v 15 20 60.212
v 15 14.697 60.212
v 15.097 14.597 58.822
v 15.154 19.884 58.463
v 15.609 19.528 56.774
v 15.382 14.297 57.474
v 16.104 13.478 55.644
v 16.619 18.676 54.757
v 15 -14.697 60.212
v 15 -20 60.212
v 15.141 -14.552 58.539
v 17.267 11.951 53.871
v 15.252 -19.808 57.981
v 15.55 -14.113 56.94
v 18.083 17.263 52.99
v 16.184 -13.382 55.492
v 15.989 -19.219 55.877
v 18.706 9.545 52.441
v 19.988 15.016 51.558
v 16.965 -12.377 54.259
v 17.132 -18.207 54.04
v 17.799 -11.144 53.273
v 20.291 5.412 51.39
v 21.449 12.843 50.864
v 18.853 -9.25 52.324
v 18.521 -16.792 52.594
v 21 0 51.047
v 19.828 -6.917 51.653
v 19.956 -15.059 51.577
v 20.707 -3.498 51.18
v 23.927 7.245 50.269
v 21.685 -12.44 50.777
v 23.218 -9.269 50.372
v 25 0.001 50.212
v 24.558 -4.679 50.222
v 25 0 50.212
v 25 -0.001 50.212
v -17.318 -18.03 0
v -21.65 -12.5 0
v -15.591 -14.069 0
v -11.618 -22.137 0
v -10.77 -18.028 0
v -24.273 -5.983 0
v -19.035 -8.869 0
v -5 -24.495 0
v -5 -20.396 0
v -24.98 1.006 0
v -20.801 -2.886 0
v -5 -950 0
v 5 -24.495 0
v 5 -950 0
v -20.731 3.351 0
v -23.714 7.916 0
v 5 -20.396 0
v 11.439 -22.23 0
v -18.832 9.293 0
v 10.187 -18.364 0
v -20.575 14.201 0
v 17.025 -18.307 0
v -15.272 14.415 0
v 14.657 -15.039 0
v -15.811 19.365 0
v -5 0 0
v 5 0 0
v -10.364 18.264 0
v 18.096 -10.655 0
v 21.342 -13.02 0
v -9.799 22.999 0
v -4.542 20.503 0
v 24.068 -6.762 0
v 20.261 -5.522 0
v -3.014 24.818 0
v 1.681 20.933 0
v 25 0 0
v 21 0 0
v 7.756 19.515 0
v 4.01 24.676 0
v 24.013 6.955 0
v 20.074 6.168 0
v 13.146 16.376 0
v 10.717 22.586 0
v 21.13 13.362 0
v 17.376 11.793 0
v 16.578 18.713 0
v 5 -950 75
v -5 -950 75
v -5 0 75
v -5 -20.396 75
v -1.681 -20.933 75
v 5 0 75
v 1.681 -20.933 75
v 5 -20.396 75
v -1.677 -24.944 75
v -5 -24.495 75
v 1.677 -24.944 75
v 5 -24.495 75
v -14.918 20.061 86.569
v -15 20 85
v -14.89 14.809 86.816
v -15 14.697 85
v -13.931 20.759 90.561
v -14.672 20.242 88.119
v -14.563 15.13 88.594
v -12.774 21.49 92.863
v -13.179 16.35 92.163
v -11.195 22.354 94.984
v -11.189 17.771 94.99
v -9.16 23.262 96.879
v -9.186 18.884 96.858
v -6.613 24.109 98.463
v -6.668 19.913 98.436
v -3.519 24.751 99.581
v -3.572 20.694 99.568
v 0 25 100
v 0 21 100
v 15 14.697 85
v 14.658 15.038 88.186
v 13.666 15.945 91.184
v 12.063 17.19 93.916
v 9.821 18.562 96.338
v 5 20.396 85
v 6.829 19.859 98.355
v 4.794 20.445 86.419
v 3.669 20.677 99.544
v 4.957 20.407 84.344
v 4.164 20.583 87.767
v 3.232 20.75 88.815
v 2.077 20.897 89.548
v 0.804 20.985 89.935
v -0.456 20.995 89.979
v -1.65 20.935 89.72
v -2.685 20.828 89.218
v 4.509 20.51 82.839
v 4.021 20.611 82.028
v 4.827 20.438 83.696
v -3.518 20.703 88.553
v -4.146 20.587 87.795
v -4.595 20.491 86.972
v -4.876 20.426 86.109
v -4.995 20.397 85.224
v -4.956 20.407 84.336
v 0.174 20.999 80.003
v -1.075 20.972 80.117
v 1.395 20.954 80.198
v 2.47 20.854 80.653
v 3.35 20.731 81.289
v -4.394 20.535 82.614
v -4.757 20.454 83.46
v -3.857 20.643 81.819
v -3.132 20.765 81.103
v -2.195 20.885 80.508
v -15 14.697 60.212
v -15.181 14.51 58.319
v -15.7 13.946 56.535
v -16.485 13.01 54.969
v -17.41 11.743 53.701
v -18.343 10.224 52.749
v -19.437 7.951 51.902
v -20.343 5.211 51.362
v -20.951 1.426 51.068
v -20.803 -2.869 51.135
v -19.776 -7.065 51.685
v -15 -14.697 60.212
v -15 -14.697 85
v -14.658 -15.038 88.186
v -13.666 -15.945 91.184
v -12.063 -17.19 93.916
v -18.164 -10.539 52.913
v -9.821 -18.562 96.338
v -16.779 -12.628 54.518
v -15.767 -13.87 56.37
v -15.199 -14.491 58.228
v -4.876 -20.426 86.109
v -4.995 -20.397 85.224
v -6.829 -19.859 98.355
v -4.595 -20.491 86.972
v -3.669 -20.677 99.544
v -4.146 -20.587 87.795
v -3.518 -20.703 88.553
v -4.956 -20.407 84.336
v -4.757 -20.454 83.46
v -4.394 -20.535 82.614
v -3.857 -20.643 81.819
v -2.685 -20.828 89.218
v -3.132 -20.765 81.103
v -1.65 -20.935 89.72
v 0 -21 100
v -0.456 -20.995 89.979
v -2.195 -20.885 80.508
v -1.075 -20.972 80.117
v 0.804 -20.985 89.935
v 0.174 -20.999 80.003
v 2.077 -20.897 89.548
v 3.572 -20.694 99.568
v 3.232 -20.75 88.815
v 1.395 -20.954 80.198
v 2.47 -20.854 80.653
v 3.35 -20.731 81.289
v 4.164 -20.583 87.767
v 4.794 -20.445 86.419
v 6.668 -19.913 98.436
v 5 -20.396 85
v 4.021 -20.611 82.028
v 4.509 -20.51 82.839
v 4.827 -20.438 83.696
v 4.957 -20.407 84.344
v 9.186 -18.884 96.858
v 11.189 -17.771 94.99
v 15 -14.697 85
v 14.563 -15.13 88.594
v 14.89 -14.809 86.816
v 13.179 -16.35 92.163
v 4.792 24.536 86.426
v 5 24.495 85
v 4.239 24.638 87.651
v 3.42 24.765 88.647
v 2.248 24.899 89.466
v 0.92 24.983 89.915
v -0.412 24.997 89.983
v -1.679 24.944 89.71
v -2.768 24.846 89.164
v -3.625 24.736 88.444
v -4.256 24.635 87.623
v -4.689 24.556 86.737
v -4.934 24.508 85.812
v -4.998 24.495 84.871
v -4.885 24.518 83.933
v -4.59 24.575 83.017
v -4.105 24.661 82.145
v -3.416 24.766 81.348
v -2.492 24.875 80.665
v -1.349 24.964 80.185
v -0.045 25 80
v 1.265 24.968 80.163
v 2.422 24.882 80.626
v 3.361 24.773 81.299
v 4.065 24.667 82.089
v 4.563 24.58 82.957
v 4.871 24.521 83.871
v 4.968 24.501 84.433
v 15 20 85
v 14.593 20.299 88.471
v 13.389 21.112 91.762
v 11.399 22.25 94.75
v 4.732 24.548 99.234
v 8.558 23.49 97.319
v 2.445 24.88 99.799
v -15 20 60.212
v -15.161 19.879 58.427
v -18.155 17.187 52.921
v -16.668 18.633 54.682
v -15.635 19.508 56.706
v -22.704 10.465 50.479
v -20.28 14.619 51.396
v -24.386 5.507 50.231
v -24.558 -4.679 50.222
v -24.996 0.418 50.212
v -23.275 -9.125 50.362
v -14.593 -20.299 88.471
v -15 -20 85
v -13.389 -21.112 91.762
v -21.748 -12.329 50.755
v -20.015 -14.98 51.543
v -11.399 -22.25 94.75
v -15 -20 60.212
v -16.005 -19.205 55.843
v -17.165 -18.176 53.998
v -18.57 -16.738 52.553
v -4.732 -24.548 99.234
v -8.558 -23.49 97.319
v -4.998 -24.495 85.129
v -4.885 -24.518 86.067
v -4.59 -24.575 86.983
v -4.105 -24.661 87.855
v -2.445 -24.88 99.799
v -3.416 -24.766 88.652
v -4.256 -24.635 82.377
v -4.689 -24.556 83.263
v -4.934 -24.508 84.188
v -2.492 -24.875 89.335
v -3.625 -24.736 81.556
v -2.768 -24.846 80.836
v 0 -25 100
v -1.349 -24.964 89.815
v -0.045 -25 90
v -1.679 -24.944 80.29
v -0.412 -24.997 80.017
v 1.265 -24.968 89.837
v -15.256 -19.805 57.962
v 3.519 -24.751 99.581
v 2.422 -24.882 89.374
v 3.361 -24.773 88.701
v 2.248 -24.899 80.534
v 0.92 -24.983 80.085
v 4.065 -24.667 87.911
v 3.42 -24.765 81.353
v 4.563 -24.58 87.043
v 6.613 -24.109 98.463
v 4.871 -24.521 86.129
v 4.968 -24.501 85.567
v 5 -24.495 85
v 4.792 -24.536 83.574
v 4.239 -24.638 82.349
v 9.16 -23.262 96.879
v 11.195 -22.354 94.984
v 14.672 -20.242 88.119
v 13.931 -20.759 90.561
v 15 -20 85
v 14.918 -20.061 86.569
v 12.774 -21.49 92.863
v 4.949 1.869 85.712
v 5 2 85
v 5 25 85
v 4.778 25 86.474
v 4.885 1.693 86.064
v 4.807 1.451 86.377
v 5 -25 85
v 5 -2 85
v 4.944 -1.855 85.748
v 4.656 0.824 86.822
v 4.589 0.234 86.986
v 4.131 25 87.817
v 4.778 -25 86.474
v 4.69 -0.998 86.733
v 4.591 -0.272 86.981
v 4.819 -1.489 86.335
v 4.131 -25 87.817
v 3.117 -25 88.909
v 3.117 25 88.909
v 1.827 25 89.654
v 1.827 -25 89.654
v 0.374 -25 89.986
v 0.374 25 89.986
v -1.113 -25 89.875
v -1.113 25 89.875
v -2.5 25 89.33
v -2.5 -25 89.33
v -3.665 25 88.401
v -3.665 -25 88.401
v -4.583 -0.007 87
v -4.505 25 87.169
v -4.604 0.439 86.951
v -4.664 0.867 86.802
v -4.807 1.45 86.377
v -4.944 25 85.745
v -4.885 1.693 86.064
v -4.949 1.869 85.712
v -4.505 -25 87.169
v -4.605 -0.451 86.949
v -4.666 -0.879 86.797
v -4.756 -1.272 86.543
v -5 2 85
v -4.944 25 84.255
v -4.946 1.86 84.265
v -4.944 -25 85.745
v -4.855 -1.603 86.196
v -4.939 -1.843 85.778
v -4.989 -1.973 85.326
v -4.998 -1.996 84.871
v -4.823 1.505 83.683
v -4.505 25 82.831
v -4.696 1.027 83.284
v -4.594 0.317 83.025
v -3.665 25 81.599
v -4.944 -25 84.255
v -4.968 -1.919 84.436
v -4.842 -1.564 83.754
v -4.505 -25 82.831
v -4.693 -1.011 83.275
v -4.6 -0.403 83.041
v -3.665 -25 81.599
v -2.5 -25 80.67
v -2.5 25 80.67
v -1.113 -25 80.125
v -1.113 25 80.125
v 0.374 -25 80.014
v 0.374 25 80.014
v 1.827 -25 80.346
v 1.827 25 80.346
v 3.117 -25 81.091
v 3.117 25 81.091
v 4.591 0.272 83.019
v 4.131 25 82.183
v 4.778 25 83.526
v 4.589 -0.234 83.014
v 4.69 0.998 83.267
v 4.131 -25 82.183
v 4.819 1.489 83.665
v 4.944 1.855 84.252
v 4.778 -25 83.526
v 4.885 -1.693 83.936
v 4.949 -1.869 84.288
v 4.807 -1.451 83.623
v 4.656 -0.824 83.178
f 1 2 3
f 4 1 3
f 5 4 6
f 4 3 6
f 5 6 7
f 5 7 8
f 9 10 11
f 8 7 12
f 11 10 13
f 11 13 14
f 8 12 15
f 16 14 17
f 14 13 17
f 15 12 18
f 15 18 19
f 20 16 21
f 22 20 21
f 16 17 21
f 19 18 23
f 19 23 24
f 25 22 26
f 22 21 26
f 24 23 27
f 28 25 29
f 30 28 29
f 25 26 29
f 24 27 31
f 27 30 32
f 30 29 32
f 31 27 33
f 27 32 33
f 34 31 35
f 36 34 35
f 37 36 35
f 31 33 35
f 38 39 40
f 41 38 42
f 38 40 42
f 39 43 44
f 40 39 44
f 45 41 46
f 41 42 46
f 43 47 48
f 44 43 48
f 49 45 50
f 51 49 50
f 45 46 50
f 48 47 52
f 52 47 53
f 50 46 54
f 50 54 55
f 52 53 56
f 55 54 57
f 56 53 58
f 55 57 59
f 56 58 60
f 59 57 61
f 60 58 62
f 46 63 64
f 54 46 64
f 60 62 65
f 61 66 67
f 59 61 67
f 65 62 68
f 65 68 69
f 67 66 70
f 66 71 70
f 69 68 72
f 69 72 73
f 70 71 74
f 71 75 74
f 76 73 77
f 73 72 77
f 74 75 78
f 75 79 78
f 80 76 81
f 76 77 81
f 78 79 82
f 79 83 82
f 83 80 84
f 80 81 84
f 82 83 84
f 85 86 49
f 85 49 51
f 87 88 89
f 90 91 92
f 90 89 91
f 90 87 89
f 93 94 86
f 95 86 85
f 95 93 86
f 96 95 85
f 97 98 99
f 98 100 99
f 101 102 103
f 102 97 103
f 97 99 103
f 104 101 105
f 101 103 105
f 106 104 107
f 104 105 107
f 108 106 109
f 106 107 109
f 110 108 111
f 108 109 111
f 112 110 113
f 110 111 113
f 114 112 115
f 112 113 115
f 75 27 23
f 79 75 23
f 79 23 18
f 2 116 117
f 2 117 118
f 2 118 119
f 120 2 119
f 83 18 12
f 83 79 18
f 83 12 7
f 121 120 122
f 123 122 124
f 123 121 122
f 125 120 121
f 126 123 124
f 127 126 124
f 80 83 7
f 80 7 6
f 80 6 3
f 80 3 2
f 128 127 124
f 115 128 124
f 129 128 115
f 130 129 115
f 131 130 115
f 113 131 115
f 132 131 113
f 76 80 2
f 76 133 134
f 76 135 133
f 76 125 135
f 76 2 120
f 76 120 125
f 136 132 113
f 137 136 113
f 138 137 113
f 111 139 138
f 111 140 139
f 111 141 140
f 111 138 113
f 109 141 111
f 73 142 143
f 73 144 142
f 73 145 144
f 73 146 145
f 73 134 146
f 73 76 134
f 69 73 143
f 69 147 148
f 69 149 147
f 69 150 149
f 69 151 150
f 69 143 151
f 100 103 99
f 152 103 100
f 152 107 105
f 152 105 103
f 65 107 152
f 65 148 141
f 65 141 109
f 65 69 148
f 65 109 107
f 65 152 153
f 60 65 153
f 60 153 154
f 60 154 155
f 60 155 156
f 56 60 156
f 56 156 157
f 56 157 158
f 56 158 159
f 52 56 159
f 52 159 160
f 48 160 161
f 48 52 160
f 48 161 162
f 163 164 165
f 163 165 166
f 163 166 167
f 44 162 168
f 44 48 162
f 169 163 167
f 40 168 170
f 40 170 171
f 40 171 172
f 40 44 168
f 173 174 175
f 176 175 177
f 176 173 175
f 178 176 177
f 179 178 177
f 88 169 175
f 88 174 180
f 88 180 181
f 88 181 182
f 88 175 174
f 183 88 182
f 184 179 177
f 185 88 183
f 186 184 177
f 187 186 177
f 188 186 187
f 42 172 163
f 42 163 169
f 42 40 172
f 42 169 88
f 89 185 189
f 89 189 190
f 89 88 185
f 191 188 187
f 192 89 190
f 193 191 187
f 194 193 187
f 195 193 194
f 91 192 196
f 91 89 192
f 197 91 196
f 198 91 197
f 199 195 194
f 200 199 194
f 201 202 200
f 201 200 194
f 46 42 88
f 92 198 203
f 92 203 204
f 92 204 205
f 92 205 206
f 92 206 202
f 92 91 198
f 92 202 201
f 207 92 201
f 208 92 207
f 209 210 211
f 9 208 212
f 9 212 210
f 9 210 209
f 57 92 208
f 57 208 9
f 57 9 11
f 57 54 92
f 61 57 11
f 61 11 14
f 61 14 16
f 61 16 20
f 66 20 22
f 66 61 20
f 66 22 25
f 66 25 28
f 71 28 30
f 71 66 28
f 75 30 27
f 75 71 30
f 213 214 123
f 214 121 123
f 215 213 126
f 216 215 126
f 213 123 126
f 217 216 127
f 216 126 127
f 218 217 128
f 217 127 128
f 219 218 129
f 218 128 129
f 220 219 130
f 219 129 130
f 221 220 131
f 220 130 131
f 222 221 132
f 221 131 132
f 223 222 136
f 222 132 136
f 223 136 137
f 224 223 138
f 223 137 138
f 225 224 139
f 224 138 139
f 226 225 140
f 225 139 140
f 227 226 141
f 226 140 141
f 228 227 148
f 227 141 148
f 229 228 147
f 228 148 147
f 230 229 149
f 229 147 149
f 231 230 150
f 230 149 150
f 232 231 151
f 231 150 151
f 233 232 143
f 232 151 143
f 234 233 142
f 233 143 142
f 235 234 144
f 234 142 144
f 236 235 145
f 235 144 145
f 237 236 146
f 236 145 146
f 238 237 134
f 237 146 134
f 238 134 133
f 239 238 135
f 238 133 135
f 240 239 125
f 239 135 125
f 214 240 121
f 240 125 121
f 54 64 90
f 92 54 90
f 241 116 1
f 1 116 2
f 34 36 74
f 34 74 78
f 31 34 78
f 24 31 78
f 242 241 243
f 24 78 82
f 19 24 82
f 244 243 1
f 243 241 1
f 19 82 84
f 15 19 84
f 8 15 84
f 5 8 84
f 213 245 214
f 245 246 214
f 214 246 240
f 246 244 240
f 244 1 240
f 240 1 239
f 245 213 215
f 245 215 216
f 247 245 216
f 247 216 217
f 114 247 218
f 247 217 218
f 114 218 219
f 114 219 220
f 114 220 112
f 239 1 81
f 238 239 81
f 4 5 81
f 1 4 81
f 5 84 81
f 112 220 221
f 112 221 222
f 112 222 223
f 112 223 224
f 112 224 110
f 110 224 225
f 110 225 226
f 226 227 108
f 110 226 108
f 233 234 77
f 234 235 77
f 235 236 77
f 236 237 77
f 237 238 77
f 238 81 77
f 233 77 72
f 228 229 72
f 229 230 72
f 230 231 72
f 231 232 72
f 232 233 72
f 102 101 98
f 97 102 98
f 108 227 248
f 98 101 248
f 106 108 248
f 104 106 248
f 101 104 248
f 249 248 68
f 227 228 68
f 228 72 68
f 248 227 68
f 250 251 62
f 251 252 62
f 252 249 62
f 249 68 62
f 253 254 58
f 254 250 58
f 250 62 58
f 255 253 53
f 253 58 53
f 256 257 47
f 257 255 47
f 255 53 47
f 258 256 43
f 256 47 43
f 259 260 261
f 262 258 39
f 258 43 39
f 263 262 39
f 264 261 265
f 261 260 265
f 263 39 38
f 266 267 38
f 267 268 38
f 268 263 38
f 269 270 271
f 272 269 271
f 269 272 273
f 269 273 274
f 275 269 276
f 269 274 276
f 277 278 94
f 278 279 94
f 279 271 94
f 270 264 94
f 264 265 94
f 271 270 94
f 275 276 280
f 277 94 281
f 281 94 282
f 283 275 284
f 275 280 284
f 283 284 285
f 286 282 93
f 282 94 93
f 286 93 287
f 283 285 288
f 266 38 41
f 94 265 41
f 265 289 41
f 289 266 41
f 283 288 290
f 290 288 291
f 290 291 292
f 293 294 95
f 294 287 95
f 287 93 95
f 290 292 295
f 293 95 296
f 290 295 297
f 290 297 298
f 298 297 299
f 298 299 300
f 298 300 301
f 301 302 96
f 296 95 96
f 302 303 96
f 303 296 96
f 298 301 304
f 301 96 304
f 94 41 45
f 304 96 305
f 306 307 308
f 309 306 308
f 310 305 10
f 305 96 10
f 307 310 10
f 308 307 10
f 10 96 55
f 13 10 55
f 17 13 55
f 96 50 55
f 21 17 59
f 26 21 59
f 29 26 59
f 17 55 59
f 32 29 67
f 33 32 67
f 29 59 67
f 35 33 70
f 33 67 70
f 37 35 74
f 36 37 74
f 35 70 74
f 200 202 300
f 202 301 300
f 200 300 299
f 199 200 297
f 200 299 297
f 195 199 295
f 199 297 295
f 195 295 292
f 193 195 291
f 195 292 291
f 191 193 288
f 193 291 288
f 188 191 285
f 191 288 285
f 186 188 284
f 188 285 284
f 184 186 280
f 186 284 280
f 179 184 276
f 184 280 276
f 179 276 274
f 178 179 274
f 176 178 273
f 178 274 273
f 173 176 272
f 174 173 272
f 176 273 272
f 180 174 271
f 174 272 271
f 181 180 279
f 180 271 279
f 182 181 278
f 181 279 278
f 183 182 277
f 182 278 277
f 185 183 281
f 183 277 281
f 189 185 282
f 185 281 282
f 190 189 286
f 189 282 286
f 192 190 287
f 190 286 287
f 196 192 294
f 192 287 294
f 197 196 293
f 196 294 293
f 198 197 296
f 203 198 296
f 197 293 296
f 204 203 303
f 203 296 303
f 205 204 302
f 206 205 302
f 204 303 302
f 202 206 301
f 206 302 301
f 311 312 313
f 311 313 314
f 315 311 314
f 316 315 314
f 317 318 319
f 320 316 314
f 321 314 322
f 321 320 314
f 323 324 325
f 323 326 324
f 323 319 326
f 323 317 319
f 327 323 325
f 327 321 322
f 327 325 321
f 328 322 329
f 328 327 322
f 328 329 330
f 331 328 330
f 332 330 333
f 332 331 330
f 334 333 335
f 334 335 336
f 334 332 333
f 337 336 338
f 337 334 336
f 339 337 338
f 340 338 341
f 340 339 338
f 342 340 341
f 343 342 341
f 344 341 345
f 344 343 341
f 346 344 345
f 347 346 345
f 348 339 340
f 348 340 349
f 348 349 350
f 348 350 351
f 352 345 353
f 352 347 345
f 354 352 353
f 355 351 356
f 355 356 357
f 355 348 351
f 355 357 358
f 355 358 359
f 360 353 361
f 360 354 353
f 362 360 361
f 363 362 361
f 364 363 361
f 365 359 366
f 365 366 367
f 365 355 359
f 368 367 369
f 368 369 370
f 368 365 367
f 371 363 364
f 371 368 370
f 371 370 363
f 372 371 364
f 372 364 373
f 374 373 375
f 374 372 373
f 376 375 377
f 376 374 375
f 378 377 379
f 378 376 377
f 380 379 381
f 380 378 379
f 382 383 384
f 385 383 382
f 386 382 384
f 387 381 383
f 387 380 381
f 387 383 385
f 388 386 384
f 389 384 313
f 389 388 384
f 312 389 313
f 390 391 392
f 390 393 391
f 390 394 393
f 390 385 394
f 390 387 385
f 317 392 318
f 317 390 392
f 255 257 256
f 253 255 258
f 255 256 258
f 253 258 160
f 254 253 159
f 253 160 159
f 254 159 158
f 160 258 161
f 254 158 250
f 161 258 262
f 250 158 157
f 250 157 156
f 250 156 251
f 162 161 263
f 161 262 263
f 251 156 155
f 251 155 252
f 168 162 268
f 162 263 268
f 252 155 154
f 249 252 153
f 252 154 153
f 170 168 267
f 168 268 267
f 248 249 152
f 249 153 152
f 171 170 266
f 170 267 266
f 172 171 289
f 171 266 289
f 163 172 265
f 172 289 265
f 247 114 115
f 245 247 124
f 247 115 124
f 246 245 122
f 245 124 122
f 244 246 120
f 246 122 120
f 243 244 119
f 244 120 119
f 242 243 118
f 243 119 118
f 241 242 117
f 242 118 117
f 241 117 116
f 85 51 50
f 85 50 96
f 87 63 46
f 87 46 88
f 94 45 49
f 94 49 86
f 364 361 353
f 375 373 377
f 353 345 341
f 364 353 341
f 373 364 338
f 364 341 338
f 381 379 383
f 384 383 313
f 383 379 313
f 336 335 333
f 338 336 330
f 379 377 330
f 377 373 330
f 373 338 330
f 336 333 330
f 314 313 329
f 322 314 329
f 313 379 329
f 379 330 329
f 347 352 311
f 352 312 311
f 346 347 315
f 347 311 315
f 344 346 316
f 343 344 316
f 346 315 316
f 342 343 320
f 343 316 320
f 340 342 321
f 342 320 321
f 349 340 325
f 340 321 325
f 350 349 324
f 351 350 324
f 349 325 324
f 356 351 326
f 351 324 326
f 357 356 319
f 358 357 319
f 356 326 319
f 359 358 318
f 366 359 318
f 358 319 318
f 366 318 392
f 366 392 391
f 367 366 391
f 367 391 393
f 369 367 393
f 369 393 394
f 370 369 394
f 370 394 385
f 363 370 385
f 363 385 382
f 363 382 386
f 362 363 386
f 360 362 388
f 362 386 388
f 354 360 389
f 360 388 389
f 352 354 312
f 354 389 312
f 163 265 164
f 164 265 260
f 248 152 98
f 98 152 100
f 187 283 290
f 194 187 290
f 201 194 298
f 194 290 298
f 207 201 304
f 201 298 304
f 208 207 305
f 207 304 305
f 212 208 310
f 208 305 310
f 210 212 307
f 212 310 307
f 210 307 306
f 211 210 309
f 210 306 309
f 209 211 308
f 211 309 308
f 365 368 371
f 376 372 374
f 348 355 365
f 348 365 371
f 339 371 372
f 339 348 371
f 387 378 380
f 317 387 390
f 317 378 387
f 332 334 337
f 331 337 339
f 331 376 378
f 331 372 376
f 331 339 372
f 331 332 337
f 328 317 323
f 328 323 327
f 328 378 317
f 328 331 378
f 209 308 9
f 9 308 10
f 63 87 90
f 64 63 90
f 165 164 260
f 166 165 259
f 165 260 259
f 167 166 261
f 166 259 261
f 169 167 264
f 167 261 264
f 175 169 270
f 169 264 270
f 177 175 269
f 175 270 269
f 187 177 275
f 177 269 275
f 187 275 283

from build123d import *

# Parameters (mm, degrees)
F0_R      = 25
F0_R_2    = 21
F1_DEPTH  = 100
F3_DEPTH  = 25
F4_R      = 5
F5_DEPTH  = 25
F6_DEPTH  = 25
F7_R      = 2
F8_DEPTH  = 5
F9_W      = 10
F9_H      = 75
F10_DEPTH = 950


with BuildPart() as f1:
    # F0 (on Top) → F1 (new body)
    with BuildSketch(Plane.XY):
        Circle(F0_R)
        Circle(F0_R_2, mode=Mode.SUBTRACT)
    extrude(amount=F1_DEPTH)

    # F2 (on Front) → F3 (cut, symmetric)
    with BuildSketch(Plane.XZ):
        with BuildLine():
            Line((25, 100), (0, 100))
            ThreePointArc((0, 100), (10.606602, 95.606602), (15, 85))
            Line((15, 85), (15, 60.211768))
            ThreePointArc((15, 60.211768), (17.928932, 53.1407), (25, 50.211768))
            Line((25, 50.211768), (25, 100))
        make_face()
        with BuildLine():
            Line((-25, 100), (-25, 50.211768))
            ThreePointArc((-25, 50.211768), (-17.928932, 53.1407), (-15, 60.211768))
            Line((-15, 60.211768), (-15, 85))
            ThreePointArc((-15, 85), (-10.606602, 95.606602), (0, 100))
            Line((0, 100), (-25, 100))
        make_face()
    extrude(amount=F3_DEPTH, both=True, mode=Mode.SUBTRACT)

    # F4 (on Front) → F5 (cut, symmetric)
    with BuildSketch(Plane.XZ):
        with Locations((0, 85)):
            Circle(F4_R)
    extrude(amount=F5_DEPTH, both=True, mode=Mode.SUBTRACT)

    # F9 (on Front) → F10 (join)
    with BuildSketch(Plane.XZ):
        with Locations((0, 37.5)):
            Rectangle(F9_W, F9_H)
    extrude(amount=F10_DEPTH)


with BuildPart() as f6:
    # F4 (on Front) → F6 (new body, symmetric)
    with BuildSketch(Plane.XZ):
        with Locations((0, 85)):
            Circle(F4_R)
    extrude(amount=F6_DEPTH, both=True)

    # F7 (on Right) → F8 (cut, symmetric)
    with BuildSketch(Plane.YZ):
        with Locations((0, 85)):
            Circle(F7_R)
    extrude(amount=F8_DEPTH, both=True, mode=Mode.SUBTRACT)


solid = Compound([f1.part, f6.part])
